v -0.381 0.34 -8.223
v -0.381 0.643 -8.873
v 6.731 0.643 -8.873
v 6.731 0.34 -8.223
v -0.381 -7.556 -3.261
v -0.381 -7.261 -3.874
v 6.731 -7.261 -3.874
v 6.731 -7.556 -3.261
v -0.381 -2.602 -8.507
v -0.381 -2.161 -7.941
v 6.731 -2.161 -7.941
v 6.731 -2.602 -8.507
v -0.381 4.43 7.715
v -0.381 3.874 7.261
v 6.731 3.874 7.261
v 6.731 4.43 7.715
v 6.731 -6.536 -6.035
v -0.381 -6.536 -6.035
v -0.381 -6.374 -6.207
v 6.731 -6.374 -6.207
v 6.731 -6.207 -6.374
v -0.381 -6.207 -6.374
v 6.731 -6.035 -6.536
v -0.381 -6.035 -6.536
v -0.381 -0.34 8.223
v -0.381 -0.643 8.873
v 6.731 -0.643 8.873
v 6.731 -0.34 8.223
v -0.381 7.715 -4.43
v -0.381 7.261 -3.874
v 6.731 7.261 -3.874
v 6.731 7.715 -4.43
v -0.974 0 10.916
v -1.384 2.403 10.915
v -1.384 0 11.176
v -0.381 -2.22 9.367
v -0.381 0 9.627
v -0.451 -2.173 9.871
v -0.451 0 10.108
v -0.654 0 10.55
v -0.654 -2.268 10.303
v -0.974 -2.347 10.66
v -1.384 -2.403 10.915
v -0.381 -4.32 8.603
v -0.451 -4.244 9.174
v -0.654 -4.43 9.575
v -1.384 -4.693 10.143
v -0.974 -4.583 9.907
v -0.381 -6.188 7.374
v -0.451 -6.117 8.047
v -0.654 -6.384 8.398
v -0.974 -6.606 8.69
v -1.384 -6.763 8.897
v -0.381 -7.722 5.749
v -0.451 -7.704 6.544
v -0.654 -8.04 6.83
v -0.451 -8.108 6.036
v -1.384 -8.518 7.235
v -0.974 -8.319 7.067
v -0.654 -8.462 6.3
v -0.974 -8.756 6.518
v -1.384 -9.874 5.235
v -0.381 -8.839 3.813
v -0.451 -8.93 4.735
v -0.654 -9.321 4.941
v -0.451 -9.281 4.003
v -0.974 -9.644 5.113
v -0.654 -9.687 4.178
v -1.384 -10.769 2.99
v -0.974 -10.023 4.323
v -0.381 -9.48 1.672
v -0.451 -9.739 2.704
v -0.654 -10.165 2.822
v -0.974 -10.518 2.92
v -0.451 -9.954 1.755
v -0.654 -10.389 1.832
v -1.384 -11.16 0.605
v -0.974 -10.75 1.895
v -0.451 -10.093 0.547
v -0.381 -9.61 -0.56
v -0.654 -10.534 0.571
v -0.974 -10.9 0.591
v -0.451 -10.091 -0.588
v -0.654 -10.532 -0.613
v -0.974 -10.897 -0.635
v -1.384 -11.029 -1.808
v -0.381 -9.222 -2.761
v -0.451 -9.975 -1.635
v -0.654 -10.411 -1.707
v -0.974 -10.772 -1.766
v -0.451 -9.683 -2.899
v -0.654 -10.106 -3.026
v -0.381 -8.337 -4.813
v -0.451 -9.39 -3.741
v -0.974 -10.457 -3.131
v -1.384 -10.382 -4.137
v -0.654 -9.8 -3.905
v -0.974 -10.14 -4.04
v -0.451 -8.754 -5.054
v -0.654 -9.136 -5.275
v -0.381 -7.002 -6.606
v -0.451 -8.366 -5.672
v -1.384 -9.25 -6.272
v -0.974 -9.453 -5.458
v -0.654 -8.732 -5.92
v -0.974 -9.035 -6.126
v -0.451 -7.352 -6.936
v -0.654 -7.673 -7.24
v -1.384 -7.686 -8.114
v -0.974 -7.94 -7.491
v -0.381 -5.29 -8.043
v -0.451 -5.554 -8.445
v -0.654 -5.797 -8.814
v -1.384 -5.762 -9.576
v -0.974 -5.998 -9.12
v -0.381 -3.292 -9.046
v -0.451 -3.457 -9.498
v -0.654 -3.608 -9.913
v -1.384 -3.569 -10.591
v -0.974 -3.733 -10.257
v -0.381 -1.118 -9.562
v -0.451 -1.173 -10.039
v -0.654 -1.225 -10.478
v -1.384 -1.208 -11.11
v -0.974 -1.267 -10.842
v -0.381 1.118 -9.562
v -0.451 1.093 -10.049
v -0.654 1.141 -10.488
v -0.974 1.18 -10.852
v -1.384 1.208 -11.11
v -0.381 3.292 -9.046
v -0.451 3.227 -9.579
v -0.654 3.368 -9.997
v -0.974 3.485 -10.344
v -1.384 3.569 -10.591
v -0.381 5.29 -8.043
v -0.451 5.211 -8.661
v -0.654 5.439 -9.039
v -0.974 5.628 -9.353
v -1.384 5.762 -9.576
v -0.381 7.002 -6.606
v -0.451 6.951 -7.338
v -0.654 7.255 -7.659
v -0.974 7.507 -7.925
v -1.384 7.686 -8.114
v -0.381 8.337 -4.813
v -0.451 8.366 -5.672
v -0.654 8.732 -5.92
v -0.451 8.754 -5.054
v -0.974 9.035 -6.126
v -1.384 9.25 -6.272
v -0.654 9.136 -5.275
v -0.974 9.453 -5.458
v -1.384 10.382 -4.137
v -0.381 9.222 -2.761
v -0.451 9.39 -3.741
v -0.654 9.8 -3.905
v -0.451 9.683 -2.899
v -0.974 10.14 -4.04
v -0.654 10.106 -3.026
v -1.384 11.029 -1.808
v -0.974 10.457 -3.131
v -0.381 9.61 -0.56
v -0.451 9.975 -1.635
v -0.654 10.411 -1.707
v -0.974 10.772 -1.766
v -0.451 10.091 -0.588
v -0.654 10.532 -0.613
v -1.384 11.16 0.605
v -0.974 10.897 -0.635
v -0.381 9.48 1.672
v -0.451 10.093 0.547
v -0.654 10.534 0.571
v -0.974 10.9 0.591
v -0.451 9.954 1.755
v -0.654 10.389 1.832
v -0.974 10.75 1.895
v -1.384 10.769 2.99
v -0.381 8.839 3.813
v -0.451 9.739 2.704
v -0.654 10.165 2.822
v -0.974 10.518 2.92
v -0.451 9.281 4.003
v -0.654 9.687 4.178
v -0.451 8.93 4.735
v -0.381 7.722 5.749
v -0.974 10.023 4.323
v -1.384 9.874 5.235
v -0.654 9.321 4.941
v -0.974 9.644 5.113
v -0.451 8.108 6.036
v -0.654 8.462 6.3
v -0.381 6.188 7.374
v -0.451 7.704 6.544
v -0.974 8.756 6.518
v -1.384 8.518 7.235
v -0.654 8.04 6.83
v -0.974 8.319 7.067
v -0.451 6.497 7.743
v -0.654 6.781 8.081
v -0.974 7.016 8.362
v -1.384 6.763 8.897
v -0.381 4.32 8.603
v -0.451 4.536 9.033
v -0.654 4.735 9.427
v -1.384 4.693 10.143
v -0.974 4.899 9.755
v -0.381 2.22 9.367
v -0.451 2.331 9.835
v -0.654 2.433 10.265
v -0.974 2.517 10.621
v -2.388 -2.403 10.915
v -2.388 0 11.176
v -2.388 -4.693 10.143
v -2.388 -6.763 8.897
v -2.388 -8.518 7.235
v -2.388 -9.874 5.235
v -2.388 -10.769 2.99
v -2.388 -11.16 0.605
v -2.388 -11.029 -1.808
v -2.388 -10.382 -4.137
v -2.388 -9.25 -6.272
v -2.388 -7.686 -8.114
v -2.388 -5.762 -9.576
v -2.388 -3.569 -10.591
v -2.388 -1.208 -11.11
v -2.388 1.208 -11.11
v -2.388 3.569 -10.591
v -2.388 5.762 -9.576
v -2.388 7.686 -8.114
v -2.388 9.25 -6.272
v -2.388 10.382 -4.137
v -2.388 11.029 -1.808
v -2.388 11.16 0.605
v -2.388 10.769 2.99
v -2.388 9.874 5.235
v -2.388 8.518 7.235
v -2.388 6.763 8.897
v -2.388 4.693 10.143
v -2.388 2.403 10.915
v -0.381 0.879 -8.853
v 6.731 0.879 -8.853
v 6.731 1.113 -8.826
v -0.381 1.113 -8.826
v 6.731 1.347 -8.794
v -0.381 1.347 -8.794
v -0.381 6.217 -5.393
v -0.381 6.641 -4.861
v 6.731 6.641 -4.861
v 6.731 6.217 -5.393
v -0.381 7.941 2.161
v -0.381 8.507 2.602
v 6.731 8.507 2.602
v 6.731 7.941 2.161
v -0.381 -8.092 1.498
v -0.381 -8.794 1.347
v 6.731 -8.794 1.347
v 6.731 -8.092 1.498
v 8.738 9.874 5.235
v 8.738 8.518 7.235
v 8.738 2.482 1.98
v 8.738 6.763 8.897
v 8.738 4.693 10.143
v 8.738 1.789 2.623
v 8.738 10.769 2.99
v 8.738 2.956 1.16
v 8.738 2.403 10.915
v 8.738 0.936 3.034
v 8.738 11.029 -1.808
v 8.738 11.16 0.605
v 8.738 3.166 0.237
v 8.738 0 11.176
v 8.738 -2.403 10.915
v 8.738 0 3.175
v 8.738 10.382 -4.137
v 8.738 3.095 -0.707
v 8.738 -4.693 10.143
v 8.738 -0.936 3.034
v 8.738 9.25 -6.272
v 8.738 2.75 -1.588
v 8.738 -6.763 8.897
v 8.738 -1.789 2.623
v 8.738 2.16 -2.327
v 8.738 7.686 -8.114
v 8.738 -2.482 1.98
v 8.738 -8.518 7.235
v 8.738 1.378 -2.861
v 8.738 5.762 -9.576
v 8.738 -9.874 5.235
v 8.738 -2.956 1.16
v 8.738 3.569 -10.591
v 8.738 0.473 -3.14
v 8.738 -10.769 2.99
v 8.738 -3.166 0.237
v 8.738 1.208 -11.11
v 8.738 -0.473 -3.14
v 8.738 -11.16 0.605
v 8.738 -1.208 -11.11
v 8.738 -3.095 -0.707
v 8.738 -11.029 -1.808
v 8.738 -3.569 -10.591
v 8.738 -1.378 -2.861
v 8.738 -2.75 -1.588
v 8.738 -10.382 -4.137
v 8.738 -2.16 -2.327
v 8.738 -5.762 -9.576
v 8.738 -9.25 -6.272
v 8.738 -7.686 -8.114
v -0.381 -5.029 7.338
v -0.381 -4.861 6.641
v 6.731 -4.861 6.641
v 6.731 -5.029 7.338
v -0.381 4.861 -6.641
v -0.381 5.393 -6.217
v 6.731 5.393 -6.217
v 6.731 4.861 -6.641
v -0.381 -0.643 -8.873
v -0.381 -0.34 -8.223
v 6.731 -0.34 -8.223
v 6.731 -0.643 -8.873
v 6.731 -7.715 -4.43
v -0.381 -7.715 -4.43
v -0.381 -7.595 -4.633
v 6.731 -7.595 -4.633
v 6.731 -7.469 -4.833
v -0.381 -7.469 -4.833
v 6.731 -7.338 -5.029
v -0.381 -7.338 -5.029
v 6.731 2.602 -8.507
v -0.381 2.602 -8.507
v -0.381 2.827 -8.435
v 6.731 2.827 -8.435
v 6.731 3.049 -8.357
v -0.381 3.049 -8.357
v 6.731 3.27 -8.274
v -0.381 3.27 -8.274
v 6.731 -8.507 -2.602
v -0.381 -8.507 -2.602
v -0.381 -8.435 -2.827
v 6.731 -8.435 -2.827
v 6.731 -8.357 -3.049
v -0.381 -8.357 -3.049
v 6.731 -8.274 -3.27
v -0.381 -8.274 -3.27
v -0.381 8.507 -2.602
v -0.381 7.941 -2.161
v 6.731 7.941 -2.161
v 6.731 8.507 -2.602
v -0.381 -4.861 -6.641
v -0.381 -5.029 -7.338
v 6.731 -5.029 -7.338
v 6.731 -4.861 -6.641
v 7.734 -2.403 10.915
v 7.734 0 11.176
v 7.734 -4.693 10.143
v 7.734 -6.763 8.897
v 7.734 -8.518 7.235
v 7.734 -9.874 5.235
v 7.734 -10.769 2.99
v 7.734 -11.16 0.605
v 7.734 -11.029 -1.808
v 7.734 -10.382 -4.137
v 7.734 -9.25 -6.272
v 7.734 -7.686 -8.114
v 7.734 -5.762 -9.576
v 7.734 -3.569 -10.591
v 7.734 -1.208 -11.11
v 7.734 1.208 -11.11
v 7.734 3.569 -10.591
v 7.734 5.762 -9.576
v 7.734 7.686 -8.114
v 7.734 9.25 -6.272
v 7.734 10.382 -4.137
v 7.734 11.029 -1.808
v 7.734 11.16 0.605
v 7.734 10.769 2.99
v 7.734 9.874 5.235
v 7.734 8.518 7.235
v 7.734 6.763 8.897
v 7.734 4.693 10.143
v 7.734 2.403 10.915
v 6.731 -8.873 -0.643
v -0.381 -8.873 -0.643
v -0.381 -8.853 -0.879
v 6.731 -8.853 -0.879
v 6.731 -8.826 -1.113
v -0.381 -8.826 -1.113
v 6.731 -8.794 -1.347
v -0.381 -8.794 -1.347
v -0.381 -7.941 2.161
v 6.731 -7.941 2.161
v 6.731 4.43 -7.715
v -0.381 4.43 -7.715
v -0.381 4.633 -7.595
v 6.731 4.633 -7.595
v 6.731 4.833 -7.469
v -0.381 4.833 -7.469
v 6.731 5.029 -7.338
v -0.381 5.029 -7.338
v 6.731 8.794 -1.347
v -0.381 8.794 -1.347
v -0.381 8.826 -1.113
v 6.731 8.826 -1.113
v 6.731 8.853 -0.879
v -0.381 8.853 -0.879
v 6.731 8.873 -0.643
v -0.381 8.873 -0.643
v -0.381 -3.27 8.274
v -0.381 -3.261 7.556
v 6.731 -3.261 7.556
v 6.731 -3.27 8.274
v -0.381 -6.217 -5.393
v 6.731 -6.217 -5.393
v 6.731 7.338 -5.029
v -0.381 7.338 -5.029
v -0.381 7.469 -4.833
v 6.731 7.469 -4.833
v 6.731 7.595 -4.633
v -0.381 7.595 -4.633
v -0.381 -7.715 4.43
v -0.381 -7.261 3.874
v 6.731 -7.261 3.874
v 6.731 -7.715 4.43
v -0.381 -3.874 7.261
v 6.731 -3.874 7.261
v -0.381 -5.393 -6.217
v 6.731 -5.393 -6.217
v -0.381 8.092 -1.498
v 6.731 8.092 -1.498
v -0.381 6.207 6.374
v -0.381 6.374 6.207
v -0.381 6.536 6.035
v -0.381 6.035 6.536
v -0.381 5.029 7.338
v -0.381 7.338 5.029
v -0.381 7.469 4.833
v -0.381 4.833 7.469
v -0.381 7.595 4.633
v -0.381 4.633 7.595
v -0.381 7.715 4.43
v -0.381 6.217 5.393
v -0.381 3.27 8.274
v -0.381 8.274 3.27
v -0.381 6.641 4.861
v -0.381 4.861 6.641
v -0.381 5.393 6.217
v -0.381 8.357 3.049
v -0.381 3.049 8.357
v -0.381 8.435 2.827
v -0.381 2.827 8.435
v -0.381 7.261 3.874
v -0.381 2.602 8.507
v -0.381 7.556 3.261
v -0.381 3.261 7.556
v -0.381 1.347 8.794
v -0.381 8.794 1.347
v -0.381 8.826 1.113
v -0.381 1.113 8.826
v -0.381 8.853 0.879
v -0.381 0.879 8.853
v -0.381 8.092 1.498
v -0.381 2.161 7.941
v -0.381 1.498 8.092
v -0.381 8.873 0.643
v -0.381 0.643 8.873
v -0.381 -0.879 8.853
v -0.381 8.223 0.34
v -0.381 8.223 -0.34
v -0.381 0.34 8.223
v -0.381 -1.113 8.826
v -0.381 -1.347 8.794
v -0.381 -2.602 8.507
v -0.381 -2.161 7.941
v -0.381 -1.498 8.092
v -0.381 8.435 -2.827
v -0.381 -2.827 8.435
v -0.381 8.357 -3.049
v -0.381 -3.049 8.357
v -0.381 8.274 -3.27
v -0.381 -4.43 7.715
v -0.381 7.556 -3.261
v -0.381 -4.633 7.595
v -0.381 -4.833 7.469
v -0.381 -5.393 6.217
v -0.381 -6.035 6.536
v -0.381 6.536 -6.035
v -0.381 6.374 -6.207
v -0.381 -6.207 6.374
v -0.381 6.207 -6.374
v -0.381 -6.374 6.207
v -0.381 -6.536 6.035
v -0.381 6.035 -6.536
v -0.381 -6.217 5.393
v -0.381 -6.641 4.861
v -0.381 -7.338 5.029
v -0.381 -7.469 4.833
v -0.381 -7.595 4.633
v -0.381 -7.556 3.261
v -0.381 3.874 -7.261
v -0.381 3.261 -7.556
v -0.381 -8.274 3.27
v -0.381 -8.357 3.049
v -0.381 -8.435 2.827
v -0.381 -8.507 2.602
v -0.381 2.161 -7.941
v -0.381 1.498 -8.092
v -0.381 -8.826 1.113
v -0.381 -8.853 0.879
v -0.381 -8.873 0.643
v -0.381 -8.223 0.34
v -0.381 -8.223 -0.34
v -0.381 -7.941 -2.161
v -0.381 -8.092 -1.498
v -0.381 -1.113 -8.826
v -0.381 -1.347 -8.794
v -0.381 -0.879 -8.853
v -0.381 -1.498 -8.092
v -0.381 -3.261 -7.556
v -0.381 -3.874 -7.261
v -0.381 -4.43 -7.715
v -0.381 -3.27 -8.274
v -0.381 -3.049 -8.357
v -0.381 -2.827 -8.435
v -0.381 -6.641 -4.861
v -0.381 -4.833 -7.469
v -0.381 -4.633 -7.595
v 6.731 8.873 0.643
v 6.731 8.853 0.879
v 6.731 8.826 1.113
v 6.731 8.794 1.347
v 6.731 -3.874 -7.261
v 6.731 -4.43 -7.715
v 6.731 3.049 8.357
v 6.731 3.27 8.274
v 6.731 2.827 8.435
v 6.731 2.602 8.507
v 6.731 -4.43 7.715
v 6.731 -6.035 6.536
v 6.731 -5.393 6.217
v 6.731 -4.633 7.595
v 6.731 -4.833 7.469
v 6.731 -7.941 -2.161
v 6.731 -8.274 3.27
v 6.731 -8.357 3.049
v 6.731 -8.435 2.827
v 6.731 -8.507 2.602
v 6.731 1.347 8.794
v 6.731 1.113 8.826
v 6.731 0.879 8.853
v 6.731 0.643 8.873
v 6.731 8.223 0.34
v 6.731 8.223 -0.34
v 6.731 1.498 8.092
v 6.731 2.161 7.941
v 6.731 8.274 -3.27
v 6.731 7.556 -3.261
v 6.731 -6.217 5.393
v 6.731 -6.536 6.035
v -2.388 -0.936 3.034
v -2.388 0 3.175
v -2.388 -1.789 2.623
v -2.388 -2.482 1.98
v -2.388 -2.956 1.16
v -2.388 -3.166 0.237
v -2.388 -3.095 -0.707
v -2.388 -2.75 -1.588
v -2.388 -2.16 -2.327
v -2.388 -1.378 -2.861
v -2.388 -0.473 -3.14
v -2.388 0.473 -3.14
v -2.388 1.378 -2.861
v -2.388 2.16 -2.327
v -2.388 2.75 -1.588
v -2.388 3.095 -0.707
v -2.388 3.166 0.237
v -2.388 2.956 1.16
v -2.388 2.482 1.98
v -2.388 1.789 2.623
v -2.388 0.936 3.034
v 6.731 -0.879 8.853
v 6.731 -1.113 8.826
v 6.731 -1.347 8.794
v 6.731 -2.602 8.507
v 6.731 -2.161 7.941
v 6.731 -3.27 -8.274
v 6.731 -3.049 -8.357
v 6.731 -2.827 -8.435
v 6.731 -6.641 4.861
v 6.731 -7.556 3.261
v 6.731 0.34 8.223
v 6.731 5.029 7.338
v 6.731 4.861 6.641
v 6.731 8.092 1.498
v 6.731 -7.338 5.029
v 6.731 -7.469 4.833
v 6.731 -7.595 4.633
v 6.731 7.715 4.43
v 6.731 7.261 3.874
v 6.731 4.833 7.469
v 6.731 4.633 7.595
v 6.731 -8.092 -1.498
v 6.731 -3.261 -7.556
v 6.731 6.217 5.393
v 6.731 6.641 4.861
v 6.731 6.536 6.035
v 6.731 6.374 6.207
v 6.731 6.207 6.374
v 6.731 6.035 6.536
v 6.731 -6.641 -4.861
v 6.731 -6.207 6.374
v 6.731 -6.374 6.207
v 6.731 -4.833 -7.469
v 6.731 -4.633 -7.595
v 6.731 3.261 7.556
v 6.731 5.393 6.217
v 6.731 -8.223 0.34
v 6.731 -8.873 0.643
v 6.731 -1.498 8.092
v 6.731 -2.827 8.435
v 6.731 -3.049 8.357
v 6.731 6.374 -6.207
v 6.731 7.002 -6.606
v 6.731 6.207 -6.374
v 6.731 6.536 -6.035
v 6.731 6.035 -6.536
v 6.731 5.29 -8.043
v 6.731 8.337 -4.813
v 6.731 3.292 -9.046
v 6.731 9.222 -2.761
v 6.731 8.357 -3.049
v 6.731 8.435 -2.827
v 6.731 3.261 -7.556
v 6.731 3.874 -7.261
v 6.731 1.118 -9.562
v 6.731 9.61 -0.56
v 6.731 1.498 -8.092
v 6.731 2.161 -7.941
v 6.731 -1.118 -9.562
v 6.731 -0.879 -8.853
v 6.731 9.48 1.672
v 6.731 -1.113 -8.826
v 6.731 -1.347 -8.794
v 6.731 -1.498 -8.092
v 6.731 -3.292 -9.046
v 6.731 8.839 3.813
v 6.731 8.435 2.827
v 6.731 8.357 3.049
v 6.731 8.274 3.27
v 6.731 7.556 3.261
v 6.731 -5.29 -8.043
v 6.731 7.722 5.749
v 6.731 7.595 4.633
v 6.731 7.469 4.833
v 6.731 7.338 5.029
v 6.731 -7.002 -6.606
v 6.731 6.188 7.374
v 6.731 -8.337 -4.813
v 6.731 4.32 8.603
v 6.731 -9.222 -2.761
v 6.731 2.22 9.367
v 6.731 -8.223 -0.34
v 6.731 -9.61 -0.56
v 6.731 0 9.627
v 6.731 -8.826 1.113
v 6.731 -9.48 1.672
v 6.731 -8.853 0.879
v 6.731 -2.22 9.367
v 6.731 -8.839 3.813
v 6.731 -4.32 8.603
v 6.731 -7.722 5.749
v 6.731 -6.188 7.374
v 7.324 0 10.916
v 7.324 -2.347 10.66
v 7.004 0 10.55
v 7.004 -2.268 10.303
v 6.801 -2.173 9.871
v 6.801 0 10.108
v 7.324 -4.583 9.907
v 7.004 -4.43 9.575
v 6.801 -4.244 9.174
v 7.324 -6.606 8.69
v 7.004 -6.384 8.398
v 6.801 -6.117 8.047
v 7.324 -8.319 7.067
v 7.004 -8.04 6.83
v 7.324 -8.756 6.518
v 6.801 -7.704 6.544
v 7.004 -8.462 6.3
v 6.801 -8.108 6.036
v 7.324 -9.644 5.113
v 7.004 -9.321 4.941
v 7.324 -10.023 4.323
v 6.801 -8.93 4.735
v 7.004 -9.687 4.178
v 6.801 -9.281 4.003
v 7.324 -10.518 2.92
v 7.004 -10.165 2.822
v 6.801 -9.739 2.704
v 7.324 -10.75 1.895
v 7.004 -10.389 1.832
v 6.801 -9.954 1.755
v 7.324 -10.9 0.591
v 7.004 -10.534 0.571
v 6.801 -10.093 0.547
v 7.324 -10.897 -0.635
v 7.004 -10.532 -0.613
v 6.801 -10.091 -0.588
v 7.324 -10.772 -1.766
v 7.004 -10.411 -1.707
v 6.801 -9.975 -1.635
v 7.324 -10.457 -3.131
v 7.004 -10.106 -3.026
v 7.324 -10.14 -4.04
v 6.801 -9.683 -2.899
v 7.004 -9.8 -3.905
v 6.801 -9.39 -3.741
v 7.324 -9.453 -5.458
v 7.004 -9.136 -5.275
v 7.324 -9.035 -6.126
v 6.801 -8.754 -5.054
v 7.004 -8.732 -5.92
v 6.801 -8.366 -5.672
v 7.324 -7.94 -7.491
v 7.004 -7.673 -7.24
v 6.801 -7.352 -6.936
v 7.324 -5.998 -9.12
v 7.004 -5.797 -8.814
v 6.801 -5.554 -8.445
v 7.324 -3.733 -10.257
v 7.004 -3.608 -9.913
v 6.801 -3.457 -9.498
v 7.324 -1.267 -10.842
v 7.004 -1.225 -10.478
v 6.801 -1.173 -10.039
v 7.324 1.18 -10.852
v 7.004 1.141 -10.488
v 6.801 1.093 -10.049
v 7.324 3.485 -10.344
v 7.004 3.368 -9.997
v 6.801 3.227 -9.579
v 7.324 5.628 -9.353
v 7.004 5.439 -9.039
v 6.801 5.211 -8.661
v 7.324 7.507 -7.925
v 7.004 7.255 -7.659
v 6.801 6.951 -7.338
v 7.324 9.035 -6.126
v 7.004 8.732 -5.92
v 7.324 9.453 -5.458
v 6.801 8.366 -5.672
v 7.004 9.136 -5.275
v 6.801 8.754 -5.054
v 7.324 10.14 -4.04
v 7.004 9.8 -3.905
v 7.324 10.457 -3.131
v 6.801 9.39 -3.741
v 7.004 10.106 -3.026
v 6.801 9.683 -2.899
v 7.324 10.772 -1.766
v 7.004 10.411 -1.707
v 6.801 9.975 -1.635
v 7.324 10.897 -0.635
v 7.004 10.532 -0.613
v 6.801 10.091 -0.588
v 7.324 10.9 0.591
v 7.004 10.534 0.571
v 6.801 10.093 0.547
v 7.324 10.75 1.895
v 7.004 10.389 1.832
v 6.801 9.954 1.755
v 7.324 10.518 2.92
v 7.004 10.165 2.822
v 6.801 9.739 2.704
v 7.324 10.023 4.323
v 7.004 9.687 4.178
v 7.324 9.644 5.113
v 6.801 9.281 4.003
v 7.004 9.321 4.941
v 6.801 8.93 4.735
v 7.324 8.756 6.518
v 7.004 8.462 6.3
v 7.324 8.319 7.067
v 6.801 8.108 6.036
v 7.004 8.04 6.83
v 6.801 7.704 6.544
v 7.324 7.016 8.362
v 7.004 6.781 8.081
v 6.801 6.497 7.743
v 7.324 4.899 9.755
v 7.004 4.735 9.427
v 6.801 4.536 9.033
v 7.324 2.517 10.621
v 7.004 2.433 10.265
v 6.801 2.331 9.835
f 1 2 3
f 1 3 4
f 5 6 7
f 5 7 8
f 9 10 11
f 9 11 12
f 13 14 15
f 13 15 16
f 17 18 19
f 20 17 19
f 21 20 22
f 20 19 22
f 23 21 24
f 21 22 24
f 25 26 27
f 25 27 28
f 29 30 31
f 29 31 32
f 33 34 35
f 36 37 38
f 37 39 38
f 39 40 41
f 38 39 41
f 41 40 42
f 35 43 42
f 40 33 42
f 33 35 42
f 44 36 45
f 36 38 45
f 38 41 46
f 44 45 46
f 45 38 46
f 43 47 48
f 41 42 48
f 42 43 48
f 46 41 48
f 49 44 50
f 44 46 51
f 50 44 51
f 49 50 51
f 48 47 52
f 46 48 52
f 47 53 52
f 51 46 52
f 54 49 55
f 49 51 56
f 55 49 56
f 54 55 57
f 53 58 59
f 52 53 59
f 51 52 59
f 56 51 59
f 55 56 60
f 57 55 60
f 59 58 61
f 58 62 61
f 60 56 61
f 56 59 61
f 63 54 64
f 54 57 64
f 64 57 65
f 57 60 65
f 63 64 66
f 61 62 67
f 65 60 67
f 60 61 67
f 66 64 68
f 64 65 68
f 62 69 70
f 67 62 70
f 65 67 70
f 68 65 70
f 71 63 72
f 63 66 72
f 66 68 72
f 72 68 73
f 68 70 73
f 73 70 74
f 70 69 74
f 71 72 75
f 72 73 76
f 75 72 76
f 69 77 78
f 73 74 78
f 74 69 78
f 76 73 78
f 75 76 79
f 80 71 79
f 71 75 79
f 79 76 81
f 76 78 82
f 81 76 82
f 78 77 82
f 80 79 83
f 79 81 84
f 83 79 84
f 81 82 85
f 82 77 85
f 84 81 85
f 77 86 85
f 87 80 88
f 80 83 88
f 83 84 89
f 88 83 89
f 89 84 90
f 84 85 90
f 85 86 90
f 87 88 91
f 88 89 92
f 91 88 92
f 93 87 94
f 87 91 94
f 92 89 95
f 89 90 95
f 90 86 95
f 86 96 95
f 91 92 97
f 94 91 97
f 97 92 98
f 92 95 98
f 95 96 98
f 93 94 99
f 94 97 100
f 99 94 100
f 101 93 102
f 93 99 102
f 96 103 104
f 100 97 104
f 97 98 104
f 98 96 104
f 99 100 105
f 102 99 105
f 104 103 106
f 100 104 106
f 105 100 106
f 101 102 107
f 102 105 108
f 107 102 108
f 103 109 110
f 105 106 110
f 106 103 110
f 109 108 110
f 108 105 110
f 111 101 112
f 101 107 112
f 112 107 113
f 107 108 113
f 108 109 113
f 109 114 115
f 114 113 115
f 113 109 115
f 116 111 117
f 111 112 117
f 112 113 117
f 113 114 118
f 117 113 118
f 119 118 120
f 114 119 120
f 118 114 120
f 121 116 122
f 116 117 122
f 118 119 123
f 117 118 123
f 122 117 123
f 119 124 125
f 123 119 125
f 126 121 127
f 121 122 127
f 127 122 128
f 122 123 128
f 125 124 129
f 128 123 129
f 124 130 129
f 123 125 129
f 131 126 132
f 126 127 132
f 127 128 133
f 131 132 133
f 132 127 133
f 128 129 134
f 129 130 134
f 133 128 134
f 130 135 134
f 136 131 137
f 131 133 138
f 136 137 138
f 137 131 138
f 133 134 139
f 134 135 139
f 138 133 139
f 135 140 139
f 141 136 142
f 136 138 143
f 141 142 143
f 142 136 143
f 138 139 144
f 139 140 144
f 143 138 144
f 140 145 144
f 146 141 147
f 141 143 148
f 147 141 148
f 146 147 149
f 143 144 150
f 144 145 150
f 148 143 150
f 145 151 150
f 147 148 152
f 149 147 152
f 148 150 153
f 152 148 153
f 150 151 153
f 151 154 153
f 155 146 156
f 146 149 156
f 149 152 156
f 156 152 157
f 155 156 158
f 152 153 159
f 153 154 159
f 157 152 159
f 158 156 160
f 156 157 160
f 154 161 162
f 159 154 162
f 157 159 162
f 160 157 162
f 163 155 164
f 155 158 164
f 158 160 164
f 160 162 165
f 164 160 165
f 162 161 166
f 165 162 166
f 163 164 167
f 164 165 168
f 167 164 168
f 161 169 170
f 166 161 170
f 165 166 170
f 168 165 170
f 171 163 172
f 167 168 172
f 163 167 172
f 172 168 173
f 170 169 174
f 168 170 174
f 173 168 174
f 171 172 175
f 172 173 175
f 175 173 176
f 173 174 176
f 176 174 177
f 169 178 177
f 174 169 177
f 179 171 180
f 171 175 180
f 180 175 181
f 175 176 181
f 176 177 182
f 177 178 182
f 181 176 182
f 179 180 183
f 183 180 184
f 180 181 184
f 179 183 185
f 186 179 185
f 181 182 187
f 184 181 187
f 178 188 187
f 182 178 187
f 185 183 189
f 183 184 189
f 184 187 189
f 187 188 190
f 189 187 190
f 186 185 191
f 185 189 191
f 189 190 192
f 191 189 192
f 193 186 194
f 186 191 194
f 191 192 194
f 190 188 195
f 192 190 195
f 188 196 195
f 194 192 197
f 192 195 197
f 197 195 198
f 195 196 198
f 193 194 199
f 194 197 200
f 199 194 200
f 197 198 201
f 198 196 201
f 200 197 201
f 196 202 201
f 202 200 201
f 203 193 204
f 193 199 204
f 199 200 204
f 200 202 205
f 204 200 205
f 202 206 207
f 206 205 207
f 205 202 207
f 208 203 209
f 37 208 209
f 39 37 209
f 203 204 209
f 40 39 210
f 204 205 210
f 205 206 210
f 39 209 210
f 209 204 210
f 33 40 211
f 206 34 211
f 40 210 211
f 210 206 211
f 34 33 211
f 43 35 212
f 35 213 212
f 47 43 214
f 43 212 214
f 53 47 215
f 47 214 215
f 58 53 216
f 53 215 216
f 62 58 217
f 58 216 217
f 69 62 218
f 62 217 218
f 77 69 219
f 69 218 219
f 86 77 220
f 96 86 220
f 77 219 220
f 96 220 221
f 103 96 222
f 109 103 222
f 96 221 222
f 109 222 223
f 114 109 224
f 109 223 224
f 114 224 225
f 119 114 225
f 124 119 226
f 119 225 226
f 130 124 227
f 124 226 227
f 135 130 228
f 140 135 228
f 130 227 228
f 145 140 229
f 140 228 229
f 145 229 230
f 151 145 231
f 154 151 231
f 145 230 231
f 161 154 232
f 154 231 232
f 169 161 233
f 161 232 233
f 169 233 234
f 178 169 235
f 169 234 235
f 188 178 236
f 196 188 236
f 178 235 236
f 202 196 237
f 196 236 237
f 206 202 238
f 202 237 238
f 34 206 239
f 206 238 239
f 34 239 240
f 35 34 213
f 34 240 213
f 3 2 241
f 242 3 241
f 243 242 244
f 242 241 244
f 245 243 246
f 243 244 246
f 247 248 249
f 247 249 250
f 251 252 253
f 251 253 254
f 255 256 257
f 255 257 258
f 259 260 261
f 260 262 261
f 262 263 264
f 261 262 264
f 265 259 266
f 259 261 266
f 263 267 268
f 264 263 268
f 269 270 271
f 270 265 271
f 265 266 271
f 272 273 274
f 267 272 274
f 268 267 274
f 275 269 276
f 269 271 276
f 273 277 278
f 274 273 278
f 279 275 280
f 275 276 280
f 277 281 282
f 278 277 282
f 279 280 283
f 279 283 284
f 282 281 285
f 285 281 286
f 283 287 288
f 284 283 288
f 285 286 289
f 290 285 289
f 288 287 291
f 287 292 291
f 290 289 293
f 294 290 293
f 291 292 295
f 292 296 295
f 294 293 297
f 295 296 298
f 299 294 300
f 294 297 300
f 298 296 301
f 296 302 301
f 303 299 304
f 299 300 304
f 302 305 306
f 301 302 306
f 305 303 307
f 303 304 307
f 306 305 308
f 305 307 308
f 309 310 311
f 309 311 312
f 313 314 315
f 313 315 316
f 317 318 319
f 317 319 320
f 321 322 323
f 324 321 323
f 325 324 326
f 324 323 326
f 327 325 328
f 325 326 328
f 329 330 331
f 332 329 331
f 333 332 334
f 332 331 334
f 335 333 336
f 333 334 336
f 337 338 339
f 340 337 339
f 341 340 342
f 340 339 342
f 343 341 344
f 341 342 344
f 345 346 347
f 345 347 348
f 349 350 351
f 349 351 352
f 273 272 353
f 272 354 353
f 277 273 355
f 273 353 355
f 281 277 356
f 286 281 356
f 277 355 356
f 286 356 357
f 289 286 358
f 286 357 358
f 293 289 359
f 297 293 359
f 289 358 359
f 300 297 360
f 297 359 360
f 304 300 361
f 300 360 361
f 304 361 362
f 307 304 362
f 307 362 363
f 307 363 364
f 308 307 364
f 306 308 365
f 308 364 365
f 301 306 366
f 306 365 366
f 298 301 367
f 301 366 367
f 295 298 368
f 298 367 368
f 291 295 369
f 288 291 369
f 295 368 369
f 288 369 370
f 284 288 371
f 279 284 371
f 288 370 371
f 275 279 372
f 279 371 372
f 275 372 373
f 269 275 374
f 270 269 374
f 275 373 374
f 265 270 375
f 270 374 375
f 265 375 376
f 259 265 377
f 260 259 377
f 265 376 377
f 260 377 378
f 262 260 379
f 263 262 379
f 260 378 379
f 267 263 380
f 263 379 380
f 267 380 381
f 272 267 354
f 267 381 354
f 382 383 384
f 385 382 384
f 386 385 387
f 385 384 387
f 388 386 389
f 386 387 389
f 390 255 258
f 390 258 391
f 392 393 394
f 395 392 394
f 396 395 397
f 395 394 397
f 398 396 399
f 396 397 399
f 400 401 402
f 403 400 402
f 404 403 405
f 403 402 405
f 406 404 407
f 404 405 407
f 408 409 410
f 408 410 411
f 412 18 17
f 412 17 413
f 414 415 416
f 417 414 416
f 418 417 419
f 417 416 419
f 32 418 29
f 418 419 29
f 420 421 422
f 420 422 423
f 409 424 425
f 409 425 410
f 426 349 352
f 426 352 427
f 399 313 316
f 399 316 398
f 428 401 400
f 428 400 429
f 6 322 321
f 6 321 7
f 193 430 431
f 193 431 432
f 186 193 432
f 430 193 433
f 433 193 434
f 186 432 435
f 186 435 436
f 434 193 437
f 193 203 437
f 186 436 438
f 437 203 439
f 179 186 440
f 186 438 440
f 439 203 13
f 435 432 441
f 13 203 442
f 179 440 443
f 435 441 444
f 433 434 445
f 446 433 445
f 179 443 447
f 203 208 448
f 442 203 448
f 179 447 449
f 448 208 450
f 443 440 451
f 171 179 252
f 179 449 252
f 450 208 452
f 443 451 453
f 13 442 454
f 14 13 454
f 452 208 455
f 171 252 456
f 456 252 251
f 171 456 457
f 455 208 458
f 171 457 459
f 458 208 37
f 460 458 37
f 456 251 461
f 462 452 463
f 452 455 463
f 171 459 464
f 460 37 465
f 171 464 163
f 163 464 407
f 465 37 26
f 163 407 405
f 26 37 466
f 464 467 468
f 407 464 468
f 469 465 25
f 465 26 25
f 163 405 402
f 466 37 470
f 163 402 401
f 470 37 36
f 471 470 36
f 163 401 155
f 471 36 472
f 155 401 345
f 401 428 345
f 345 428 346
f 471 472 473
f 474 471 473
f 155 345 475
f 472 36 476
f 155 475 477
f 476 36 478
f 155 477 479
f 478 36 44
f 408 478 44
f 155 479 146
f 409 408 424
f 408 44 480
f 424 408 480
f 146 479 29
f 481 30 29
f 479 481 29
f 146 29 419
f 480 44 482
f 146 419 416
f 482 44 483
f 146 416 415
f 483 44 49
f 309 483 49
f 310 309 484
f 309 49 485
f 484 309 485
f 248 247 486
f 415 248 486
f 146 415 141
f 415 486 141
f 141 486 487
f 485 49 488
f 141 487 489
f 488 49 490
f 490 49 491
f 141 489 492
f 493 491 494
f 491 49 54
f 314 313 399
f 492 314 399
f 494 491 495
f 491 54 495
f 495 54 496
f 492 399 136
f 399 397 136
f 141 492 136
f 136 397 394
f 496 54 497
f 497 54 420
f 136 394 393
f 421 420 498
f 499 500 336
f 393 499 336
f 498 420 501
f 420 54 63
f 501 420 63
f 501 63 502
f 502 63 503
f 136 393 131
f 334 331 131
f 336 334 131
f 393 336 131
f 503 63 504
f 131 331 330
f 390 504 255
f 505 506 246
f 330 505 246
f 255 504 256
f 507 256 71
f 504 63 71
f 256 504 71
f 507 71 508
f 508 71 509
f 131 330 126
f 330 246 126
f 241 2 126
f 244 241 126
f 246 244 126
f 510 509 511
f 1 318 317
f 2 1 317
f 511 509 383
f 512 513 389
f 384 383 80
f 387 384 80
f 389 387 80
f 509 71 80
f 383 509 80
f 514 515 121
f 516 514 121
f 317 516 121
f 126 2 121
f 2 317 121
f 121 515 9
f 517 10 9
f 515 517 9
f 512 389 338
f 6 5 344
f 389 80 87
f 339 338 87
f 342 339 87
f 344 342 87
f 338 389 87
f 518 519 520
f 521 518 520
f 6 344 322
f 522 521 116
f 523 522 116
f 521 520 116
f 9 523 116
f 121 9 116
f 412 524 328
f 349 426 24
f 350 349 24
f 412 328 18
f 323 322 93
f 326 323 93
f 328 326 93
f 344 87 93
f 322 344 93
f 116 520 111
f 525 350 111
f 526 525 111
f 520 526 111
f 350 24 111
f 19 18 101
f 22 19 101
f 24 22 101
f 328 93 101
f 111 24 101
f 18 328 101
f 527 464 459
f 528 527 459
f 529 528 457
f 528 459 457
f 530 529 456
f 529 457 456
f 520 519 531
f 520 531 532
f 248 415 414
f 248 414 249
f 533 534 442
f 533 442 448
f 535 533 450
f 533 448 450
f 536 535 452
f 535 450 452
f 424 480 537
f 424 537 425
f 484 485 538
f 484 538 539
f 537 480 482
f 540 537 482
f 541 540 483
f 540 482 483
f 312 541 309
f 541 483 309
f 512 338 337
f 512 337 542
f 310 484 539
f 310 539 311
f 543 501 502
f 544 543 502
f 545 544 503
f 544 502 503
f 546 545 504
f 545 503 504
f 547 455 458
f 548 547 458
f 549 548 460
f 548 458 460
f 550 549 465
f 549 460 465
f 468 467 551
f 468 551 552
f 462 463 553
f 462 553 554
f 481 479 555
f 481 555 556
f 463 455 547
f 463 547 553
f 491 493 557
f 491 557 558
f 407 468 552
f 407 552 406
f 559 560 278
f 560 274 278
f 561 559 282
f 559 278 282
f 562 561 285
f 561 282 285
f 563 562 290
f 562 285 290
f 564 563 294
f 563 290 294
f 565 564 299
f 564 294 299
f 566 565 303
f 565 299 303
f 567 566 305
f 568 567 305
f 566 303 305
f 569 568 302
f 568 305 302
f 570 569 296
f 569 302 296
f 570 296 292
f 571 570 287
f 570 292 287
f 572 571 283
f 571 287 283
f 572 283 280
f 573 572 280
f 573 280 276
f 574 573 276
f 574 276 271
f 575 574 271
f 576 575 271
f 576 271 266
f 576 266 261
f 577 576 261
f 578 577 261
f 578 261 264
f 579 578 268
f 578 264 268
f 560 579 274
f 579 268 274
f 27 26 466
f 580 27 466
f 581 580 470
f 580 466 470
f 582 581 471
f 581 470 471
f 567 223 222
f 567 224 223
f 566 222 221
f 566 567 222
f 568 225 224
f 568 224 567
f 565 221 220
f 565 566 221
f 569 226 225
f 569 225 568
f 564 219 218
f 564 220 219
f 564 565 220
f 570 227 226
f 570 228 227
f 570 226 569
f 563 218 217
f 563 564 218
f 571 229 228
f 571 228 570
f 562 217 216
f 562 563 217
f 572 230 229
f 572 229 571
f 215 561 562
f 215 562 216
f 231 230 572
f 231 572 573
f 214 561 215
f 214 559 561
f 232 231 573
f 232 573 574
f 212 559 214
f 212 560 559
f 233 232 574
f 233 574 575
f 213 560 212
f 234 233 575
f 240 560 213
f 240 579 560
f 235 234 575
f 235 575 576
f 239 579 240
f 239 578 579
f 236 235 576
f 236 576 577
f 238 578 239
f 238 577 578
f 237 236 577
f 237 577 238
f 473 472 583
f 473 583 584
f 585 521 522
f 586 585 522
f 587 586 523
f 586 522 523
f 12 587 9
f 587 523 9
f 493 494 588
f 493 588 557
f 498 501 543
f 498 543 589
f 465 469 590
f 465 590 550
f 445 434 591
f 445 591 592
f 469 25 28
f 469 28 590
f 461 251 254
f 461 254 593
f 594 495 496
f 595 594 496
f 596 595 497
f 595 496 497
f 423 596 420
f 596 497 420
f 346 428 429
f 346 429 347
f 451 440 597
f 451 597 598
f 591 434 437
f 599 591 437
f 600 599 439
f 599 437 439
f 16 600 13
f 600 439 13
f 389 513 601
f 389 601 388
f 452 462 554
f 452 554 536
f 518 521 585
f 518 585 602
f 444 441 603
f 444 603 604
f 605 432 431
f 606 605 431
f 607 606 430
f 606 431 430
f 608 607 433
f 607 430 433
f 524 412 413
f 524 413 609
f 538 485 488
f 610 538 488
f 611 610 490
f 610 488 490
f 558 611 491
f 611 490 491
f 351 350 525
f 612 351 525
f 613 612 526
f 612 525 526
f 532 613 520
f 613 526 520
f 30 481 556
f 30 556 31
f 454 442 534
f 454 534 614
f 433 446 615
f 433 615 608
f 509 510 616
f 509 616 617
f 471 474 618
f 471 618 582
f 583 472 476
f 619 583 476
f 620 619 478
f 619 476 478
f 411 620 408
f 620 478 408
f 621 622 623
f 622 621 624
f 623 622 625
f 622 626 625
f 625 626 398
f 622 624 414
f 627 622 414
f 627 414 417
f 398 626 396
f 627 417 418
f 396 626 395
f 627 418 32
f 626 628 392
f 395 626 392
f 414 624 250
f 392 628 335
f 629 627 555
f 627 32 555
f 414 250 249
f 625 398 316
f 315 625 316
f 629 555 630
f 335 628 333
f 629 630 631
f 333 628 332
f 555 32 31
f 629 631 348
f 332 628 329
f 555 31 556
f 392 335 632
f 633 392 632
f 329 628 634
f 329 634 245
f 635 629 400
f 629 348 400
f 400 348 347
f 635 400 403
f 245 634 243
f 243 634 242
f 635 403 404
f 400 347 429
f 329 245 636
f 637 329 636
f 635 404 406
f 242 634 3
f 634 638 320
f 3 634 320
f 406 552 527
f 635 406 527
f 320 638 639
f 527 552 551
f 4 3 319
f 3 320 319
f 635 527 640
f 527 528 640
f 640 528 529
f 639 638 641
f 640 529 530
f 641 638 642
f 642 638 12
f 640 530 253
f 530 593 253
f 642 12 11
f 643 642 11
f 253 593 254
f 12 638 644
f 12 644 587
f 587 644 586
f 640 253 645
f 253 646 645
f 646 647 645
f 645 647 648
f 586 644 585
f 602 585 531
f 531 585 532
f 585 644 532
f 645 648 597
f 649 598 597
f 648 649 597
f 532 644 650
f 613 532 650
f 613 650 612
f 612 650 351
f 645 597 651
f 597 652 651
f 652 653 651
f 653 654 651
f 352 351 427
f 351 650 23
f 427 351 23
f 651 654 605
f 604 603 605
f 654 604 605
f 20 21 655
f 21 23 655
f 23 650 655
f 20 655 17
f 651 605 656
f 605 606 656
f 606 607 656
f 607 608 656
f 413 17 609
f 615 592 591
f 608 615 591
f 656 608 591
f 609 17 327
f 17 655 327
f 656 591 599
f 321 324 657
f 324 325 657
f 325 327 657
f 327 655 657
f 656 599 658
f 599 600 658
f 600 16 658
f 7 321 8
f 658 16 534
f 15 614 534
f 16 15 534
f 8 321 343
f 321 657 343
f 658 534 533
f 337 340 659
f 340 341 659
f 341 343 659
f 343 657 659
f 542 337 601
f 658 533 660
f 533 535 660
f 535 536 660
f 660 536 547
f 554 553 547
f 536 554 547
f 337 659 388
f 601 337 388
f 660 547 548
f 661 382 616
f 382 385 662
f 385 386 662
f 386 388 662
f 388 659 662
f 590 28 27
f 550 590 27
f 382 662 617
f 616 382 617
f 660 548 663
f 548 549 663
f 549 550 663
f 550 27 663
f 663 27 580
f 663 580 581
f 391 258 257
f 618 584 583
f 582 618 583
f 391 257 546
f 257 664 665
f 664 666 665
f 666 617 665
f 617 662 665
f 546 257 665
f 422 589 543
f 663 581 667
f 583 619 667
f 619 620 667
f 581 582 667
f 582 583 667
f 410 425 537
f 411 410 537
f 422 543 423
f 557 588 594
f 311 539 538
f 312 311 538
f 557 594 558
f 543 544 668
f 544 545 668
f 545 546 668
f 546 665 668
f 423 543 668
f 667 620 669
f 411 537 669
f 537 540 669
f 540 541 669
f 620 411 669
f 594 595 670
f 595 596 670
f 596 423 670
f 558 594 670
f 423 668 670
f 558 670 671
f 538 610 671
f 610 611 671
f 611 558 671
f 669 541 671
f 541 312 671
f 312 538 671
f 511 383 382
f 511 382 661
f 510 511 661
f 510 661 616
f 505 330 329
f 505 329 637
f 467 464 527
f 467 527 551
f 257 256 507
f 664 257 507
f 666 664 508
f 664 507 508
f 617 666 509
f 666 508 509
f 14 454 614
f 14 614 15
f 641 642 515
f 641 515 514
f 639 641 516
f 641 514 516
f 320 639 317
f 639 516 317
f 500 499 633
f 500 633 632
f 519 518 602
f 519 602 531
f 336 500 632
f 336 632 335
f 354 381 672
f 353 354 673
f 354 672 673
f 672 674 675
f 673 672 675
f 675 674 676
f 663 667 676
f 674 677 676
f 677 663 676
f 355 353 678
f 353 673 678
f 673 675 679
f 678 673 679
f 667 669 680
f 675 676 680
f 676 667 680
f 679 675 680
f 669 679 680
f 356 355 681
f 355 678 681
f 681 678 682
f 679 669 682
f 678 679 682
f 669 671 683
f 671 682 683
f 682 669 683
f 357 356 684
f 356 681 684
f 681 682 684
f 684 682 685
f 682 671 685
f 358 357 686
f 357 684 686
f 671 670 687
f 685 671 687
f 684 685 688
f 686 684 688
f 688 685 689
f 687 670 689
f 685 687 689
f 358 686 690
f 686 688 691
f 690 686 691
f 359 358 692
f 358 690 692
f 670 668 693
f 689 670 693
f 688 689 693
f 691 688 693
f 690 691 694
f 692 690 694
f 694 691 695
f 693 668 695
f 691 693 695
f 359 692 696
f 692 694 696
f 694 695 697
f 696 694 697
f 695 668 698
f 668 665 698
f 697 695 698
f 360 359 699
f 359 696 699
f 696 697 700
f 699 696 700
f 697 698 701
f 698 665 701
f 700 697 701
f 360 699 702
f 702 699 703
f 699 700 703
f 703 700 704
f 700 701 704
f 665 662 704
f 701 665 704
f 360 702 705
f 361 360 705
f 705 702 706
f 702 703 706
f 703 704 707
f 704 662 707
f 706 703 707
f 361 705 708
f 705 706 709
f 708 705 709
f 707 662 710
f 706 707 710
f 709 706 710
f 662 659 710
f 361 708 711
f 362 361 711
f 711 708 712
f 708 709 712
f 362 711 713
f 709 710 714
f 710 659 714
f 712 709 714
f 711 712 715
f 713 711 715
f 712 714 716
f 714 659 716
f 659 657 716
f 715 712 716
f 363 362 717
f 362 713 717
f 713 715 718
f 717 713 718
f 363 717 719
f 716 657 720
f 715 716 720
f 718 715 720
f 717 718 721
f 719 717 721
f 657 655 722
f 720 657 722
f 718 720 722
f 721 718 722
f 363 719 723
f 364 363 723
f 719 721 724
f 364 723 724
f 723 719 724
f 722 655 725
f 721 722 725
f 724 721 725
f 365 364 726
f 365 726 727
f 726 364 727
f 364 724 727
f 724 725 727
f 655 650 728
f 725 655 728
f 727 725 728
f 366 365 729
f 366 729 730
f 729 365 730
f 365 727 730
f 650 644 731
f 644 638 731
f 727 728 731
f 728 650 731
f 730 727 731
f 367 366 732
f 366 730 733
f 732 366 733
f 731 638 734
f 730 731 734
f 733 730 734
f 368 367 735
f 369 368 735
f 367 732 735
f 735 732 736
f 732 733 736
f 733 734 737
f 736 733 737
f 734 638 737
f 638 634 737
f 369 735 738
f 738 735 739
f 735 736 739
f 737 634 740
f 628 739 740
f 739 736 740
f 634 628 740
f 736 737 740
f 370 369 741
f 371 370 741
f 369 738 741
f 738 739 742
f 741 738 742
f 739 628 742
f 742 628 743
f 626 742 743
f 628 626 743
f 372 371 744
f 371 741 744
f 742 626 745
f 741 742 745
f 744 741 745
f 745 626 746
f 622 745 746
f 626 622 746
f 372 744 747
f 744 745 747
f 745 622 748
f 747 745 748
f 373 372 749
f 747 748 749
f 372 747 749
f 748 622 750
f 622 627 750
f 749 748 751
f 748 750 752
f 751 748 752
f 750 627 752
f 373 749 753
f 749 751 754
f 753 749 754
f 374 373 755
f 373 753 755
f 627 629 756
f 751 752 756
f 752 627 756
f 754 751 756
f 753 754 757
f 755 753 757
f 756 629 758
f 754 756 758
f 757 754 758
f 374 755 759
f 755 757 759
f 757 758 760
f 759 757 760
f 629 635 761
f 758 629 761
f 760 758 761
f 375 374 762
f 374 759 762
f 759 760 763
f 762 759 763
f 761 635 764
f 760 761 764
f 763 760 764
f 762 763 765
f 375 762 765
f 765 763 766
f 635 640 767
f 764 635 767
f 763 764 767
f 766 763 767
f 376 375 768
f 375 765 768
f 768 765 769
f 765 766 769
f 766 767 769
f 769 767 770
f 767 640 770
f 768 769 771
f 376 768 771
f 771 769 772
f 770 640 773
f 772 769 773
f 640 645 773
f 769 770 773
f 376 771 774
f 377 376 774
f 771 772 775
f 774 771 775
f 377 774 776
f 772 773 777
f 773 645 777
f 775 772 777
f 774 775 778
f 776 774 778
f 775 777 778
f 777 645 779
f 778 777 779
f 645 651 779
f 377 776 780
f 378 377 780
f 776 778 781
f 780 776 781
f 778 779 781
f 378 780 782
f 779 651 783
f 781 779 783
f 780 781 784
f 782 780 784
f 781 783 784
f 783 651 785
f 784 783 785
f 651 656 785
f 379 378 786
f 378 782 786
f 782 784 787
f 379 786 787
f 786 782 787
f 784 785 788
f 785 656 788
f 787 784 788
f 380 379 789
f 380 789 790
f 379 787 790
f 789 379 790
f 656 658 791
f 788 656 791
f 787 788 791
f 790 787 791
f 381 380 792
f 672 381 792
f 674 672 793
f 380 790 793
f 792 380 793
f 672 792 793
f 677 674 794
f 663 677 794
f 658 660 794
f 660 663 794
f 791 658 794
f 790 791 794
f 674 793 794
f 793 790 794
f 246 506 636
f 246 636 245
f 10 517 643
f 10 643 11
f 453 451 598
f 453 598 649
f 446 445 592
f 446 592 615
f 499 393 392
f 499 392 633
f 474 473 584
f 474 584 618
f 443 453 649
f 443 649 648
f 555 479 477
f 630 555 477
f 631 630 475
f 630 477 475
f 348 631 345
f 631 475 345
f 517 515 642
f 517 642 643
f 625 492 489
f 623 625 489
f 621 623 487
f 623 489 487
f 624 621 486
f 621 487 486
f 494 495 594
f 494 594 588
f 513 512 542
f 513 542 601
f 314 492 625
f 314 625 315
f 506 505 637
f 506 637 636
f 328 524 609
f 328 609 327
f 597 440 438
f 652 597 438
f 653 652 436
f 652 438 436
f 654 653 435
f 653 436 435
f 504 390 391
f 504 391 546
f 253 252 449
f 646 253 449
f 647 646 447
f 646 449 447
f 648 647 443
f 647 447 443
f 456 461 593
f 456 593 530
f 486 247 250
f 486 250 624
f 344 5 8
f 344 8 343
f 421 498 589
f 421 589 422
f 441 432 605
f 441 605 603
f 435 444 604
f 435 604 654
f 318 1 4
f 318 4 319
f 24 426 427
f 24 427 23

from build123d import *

# Parameters (mm, degrees)
SKETCH4_R          = 9.0551
SKETCH4_R_2        = 8.89635
CUT_EXTRUDE2_DEPTH = 7.112
CUT_EXTRUDE1_DEPTH = 7.112
CIRPATTERN1_COUNT  = 28
SKETCH6_R          = 8.7376
CUT_EXTRUDE3_DEPTH = 6.35


with BuildPart() as part:
    # Sketch1 → Revolve1 (revolve)
    with BuildSketch(Plane.XY, mode=Mode.PRIVATE) as revolve1_sk:
        with BuildLine():
            Line((-8.7376, 3.175), (8.7376, 3.175))
            Line((8.7376, 3.175), (8.7376, 11.176))
            Line((8.7376, 11.176), (7.7343, 11.176))
            ThreePointArc((7.7343, 11.176), (7.003726949, 10.549537058), (6.731, 9.6266))
            Line((6.731, 9.6266), (6.731, 9.0551))
            Line((6.731, 9.0551), (-0.381, 9.0551))
            Line((-0.381, 9.0551), (-0.381, 9.6266))
            ThreePointArc((-0.381, 9.6266), (-0.653726949, 10.549537058), (-1.3843, 11.176))
            Line((-1.3843, 11.176), (-2.3876, 11.176))
            Line((-2.3876, 11.176), (-2.3876, 8.7376))
            Line((-2.3876, 8.7376), (-8.7376, 8.7376))
            Line((-8.7376, 8.7376), (-8.7376, 3.175))
        make_face()
    revolve(revolve1_sk.sketch.rotate(Axis((-8.7376, 0, 0), (1, 0, 0)), 90), axis=Axis((-8.7376, 0, 0), (1, 0, 0)))

    # Sketch4 → Cut-Extrude2 (cut)
    with BuildSketch(Plane(origin=(-0.381, 0, 0), x_dir=(0, 0, -1), z_dir=(1, 0, 0))):
        Circle(SKETCH4_R)
        Circle(SKETCH4_R_2, mode=Mode.SUBTRACT)
    extrude(amount=CUT_EXTRUDE2_DEPTH, mode=Mode.SUBTRACT)

    # Sketch3 → Cut-Extrude1 (cut)
    with BuildSketch(Plane(origin=(-0.381, 0, 0), x_dir=(0, 0, -1), z_dir=(1, 0, 0))):
        with BuildLine():
            Line((-0.643388094, 8.873054439), (-0.340062676, 8.222570981))
            Line((-0.340062676, 8.222570981), (0.340062676, 8.222570981))
            Line((0.340062676, 8.222570981), (0.643388094, 8.873054439))
            ThreePointArc((0.643388094, 8.873054439), (0, 8.89635), (-0.643388094, 8.873054439))
        make_face()
    cut_extrude1 = extrude(amount=CUT_EXTRUDE1_DEPTH, mode=Mode.SUBTRACT)

    # CirPattern1: Cut-Extrude1 ×28 about axis
    cirpattern1_axis = Axis((0, 0, 0), (1, 0, 0))
    for i in range(1, CIRPATTERN1_COUNT):
        add(cut_extrude1.rotate(cirpattern1_axis, i * 360 / CIRPATTERN1_COUNT), mode=Mode.SUBTRACT)

    # Sketch6 → Cut-Extrude3 (cut)
    with BuildSketch(Plane.ZY.offset(8.7376)):
        Circle(SKETCH6_R)
    extrude(amount=-CUT_EXTRUDE3_DEPTH, mode=Mode.SUBTRACT)


solid = part.part
